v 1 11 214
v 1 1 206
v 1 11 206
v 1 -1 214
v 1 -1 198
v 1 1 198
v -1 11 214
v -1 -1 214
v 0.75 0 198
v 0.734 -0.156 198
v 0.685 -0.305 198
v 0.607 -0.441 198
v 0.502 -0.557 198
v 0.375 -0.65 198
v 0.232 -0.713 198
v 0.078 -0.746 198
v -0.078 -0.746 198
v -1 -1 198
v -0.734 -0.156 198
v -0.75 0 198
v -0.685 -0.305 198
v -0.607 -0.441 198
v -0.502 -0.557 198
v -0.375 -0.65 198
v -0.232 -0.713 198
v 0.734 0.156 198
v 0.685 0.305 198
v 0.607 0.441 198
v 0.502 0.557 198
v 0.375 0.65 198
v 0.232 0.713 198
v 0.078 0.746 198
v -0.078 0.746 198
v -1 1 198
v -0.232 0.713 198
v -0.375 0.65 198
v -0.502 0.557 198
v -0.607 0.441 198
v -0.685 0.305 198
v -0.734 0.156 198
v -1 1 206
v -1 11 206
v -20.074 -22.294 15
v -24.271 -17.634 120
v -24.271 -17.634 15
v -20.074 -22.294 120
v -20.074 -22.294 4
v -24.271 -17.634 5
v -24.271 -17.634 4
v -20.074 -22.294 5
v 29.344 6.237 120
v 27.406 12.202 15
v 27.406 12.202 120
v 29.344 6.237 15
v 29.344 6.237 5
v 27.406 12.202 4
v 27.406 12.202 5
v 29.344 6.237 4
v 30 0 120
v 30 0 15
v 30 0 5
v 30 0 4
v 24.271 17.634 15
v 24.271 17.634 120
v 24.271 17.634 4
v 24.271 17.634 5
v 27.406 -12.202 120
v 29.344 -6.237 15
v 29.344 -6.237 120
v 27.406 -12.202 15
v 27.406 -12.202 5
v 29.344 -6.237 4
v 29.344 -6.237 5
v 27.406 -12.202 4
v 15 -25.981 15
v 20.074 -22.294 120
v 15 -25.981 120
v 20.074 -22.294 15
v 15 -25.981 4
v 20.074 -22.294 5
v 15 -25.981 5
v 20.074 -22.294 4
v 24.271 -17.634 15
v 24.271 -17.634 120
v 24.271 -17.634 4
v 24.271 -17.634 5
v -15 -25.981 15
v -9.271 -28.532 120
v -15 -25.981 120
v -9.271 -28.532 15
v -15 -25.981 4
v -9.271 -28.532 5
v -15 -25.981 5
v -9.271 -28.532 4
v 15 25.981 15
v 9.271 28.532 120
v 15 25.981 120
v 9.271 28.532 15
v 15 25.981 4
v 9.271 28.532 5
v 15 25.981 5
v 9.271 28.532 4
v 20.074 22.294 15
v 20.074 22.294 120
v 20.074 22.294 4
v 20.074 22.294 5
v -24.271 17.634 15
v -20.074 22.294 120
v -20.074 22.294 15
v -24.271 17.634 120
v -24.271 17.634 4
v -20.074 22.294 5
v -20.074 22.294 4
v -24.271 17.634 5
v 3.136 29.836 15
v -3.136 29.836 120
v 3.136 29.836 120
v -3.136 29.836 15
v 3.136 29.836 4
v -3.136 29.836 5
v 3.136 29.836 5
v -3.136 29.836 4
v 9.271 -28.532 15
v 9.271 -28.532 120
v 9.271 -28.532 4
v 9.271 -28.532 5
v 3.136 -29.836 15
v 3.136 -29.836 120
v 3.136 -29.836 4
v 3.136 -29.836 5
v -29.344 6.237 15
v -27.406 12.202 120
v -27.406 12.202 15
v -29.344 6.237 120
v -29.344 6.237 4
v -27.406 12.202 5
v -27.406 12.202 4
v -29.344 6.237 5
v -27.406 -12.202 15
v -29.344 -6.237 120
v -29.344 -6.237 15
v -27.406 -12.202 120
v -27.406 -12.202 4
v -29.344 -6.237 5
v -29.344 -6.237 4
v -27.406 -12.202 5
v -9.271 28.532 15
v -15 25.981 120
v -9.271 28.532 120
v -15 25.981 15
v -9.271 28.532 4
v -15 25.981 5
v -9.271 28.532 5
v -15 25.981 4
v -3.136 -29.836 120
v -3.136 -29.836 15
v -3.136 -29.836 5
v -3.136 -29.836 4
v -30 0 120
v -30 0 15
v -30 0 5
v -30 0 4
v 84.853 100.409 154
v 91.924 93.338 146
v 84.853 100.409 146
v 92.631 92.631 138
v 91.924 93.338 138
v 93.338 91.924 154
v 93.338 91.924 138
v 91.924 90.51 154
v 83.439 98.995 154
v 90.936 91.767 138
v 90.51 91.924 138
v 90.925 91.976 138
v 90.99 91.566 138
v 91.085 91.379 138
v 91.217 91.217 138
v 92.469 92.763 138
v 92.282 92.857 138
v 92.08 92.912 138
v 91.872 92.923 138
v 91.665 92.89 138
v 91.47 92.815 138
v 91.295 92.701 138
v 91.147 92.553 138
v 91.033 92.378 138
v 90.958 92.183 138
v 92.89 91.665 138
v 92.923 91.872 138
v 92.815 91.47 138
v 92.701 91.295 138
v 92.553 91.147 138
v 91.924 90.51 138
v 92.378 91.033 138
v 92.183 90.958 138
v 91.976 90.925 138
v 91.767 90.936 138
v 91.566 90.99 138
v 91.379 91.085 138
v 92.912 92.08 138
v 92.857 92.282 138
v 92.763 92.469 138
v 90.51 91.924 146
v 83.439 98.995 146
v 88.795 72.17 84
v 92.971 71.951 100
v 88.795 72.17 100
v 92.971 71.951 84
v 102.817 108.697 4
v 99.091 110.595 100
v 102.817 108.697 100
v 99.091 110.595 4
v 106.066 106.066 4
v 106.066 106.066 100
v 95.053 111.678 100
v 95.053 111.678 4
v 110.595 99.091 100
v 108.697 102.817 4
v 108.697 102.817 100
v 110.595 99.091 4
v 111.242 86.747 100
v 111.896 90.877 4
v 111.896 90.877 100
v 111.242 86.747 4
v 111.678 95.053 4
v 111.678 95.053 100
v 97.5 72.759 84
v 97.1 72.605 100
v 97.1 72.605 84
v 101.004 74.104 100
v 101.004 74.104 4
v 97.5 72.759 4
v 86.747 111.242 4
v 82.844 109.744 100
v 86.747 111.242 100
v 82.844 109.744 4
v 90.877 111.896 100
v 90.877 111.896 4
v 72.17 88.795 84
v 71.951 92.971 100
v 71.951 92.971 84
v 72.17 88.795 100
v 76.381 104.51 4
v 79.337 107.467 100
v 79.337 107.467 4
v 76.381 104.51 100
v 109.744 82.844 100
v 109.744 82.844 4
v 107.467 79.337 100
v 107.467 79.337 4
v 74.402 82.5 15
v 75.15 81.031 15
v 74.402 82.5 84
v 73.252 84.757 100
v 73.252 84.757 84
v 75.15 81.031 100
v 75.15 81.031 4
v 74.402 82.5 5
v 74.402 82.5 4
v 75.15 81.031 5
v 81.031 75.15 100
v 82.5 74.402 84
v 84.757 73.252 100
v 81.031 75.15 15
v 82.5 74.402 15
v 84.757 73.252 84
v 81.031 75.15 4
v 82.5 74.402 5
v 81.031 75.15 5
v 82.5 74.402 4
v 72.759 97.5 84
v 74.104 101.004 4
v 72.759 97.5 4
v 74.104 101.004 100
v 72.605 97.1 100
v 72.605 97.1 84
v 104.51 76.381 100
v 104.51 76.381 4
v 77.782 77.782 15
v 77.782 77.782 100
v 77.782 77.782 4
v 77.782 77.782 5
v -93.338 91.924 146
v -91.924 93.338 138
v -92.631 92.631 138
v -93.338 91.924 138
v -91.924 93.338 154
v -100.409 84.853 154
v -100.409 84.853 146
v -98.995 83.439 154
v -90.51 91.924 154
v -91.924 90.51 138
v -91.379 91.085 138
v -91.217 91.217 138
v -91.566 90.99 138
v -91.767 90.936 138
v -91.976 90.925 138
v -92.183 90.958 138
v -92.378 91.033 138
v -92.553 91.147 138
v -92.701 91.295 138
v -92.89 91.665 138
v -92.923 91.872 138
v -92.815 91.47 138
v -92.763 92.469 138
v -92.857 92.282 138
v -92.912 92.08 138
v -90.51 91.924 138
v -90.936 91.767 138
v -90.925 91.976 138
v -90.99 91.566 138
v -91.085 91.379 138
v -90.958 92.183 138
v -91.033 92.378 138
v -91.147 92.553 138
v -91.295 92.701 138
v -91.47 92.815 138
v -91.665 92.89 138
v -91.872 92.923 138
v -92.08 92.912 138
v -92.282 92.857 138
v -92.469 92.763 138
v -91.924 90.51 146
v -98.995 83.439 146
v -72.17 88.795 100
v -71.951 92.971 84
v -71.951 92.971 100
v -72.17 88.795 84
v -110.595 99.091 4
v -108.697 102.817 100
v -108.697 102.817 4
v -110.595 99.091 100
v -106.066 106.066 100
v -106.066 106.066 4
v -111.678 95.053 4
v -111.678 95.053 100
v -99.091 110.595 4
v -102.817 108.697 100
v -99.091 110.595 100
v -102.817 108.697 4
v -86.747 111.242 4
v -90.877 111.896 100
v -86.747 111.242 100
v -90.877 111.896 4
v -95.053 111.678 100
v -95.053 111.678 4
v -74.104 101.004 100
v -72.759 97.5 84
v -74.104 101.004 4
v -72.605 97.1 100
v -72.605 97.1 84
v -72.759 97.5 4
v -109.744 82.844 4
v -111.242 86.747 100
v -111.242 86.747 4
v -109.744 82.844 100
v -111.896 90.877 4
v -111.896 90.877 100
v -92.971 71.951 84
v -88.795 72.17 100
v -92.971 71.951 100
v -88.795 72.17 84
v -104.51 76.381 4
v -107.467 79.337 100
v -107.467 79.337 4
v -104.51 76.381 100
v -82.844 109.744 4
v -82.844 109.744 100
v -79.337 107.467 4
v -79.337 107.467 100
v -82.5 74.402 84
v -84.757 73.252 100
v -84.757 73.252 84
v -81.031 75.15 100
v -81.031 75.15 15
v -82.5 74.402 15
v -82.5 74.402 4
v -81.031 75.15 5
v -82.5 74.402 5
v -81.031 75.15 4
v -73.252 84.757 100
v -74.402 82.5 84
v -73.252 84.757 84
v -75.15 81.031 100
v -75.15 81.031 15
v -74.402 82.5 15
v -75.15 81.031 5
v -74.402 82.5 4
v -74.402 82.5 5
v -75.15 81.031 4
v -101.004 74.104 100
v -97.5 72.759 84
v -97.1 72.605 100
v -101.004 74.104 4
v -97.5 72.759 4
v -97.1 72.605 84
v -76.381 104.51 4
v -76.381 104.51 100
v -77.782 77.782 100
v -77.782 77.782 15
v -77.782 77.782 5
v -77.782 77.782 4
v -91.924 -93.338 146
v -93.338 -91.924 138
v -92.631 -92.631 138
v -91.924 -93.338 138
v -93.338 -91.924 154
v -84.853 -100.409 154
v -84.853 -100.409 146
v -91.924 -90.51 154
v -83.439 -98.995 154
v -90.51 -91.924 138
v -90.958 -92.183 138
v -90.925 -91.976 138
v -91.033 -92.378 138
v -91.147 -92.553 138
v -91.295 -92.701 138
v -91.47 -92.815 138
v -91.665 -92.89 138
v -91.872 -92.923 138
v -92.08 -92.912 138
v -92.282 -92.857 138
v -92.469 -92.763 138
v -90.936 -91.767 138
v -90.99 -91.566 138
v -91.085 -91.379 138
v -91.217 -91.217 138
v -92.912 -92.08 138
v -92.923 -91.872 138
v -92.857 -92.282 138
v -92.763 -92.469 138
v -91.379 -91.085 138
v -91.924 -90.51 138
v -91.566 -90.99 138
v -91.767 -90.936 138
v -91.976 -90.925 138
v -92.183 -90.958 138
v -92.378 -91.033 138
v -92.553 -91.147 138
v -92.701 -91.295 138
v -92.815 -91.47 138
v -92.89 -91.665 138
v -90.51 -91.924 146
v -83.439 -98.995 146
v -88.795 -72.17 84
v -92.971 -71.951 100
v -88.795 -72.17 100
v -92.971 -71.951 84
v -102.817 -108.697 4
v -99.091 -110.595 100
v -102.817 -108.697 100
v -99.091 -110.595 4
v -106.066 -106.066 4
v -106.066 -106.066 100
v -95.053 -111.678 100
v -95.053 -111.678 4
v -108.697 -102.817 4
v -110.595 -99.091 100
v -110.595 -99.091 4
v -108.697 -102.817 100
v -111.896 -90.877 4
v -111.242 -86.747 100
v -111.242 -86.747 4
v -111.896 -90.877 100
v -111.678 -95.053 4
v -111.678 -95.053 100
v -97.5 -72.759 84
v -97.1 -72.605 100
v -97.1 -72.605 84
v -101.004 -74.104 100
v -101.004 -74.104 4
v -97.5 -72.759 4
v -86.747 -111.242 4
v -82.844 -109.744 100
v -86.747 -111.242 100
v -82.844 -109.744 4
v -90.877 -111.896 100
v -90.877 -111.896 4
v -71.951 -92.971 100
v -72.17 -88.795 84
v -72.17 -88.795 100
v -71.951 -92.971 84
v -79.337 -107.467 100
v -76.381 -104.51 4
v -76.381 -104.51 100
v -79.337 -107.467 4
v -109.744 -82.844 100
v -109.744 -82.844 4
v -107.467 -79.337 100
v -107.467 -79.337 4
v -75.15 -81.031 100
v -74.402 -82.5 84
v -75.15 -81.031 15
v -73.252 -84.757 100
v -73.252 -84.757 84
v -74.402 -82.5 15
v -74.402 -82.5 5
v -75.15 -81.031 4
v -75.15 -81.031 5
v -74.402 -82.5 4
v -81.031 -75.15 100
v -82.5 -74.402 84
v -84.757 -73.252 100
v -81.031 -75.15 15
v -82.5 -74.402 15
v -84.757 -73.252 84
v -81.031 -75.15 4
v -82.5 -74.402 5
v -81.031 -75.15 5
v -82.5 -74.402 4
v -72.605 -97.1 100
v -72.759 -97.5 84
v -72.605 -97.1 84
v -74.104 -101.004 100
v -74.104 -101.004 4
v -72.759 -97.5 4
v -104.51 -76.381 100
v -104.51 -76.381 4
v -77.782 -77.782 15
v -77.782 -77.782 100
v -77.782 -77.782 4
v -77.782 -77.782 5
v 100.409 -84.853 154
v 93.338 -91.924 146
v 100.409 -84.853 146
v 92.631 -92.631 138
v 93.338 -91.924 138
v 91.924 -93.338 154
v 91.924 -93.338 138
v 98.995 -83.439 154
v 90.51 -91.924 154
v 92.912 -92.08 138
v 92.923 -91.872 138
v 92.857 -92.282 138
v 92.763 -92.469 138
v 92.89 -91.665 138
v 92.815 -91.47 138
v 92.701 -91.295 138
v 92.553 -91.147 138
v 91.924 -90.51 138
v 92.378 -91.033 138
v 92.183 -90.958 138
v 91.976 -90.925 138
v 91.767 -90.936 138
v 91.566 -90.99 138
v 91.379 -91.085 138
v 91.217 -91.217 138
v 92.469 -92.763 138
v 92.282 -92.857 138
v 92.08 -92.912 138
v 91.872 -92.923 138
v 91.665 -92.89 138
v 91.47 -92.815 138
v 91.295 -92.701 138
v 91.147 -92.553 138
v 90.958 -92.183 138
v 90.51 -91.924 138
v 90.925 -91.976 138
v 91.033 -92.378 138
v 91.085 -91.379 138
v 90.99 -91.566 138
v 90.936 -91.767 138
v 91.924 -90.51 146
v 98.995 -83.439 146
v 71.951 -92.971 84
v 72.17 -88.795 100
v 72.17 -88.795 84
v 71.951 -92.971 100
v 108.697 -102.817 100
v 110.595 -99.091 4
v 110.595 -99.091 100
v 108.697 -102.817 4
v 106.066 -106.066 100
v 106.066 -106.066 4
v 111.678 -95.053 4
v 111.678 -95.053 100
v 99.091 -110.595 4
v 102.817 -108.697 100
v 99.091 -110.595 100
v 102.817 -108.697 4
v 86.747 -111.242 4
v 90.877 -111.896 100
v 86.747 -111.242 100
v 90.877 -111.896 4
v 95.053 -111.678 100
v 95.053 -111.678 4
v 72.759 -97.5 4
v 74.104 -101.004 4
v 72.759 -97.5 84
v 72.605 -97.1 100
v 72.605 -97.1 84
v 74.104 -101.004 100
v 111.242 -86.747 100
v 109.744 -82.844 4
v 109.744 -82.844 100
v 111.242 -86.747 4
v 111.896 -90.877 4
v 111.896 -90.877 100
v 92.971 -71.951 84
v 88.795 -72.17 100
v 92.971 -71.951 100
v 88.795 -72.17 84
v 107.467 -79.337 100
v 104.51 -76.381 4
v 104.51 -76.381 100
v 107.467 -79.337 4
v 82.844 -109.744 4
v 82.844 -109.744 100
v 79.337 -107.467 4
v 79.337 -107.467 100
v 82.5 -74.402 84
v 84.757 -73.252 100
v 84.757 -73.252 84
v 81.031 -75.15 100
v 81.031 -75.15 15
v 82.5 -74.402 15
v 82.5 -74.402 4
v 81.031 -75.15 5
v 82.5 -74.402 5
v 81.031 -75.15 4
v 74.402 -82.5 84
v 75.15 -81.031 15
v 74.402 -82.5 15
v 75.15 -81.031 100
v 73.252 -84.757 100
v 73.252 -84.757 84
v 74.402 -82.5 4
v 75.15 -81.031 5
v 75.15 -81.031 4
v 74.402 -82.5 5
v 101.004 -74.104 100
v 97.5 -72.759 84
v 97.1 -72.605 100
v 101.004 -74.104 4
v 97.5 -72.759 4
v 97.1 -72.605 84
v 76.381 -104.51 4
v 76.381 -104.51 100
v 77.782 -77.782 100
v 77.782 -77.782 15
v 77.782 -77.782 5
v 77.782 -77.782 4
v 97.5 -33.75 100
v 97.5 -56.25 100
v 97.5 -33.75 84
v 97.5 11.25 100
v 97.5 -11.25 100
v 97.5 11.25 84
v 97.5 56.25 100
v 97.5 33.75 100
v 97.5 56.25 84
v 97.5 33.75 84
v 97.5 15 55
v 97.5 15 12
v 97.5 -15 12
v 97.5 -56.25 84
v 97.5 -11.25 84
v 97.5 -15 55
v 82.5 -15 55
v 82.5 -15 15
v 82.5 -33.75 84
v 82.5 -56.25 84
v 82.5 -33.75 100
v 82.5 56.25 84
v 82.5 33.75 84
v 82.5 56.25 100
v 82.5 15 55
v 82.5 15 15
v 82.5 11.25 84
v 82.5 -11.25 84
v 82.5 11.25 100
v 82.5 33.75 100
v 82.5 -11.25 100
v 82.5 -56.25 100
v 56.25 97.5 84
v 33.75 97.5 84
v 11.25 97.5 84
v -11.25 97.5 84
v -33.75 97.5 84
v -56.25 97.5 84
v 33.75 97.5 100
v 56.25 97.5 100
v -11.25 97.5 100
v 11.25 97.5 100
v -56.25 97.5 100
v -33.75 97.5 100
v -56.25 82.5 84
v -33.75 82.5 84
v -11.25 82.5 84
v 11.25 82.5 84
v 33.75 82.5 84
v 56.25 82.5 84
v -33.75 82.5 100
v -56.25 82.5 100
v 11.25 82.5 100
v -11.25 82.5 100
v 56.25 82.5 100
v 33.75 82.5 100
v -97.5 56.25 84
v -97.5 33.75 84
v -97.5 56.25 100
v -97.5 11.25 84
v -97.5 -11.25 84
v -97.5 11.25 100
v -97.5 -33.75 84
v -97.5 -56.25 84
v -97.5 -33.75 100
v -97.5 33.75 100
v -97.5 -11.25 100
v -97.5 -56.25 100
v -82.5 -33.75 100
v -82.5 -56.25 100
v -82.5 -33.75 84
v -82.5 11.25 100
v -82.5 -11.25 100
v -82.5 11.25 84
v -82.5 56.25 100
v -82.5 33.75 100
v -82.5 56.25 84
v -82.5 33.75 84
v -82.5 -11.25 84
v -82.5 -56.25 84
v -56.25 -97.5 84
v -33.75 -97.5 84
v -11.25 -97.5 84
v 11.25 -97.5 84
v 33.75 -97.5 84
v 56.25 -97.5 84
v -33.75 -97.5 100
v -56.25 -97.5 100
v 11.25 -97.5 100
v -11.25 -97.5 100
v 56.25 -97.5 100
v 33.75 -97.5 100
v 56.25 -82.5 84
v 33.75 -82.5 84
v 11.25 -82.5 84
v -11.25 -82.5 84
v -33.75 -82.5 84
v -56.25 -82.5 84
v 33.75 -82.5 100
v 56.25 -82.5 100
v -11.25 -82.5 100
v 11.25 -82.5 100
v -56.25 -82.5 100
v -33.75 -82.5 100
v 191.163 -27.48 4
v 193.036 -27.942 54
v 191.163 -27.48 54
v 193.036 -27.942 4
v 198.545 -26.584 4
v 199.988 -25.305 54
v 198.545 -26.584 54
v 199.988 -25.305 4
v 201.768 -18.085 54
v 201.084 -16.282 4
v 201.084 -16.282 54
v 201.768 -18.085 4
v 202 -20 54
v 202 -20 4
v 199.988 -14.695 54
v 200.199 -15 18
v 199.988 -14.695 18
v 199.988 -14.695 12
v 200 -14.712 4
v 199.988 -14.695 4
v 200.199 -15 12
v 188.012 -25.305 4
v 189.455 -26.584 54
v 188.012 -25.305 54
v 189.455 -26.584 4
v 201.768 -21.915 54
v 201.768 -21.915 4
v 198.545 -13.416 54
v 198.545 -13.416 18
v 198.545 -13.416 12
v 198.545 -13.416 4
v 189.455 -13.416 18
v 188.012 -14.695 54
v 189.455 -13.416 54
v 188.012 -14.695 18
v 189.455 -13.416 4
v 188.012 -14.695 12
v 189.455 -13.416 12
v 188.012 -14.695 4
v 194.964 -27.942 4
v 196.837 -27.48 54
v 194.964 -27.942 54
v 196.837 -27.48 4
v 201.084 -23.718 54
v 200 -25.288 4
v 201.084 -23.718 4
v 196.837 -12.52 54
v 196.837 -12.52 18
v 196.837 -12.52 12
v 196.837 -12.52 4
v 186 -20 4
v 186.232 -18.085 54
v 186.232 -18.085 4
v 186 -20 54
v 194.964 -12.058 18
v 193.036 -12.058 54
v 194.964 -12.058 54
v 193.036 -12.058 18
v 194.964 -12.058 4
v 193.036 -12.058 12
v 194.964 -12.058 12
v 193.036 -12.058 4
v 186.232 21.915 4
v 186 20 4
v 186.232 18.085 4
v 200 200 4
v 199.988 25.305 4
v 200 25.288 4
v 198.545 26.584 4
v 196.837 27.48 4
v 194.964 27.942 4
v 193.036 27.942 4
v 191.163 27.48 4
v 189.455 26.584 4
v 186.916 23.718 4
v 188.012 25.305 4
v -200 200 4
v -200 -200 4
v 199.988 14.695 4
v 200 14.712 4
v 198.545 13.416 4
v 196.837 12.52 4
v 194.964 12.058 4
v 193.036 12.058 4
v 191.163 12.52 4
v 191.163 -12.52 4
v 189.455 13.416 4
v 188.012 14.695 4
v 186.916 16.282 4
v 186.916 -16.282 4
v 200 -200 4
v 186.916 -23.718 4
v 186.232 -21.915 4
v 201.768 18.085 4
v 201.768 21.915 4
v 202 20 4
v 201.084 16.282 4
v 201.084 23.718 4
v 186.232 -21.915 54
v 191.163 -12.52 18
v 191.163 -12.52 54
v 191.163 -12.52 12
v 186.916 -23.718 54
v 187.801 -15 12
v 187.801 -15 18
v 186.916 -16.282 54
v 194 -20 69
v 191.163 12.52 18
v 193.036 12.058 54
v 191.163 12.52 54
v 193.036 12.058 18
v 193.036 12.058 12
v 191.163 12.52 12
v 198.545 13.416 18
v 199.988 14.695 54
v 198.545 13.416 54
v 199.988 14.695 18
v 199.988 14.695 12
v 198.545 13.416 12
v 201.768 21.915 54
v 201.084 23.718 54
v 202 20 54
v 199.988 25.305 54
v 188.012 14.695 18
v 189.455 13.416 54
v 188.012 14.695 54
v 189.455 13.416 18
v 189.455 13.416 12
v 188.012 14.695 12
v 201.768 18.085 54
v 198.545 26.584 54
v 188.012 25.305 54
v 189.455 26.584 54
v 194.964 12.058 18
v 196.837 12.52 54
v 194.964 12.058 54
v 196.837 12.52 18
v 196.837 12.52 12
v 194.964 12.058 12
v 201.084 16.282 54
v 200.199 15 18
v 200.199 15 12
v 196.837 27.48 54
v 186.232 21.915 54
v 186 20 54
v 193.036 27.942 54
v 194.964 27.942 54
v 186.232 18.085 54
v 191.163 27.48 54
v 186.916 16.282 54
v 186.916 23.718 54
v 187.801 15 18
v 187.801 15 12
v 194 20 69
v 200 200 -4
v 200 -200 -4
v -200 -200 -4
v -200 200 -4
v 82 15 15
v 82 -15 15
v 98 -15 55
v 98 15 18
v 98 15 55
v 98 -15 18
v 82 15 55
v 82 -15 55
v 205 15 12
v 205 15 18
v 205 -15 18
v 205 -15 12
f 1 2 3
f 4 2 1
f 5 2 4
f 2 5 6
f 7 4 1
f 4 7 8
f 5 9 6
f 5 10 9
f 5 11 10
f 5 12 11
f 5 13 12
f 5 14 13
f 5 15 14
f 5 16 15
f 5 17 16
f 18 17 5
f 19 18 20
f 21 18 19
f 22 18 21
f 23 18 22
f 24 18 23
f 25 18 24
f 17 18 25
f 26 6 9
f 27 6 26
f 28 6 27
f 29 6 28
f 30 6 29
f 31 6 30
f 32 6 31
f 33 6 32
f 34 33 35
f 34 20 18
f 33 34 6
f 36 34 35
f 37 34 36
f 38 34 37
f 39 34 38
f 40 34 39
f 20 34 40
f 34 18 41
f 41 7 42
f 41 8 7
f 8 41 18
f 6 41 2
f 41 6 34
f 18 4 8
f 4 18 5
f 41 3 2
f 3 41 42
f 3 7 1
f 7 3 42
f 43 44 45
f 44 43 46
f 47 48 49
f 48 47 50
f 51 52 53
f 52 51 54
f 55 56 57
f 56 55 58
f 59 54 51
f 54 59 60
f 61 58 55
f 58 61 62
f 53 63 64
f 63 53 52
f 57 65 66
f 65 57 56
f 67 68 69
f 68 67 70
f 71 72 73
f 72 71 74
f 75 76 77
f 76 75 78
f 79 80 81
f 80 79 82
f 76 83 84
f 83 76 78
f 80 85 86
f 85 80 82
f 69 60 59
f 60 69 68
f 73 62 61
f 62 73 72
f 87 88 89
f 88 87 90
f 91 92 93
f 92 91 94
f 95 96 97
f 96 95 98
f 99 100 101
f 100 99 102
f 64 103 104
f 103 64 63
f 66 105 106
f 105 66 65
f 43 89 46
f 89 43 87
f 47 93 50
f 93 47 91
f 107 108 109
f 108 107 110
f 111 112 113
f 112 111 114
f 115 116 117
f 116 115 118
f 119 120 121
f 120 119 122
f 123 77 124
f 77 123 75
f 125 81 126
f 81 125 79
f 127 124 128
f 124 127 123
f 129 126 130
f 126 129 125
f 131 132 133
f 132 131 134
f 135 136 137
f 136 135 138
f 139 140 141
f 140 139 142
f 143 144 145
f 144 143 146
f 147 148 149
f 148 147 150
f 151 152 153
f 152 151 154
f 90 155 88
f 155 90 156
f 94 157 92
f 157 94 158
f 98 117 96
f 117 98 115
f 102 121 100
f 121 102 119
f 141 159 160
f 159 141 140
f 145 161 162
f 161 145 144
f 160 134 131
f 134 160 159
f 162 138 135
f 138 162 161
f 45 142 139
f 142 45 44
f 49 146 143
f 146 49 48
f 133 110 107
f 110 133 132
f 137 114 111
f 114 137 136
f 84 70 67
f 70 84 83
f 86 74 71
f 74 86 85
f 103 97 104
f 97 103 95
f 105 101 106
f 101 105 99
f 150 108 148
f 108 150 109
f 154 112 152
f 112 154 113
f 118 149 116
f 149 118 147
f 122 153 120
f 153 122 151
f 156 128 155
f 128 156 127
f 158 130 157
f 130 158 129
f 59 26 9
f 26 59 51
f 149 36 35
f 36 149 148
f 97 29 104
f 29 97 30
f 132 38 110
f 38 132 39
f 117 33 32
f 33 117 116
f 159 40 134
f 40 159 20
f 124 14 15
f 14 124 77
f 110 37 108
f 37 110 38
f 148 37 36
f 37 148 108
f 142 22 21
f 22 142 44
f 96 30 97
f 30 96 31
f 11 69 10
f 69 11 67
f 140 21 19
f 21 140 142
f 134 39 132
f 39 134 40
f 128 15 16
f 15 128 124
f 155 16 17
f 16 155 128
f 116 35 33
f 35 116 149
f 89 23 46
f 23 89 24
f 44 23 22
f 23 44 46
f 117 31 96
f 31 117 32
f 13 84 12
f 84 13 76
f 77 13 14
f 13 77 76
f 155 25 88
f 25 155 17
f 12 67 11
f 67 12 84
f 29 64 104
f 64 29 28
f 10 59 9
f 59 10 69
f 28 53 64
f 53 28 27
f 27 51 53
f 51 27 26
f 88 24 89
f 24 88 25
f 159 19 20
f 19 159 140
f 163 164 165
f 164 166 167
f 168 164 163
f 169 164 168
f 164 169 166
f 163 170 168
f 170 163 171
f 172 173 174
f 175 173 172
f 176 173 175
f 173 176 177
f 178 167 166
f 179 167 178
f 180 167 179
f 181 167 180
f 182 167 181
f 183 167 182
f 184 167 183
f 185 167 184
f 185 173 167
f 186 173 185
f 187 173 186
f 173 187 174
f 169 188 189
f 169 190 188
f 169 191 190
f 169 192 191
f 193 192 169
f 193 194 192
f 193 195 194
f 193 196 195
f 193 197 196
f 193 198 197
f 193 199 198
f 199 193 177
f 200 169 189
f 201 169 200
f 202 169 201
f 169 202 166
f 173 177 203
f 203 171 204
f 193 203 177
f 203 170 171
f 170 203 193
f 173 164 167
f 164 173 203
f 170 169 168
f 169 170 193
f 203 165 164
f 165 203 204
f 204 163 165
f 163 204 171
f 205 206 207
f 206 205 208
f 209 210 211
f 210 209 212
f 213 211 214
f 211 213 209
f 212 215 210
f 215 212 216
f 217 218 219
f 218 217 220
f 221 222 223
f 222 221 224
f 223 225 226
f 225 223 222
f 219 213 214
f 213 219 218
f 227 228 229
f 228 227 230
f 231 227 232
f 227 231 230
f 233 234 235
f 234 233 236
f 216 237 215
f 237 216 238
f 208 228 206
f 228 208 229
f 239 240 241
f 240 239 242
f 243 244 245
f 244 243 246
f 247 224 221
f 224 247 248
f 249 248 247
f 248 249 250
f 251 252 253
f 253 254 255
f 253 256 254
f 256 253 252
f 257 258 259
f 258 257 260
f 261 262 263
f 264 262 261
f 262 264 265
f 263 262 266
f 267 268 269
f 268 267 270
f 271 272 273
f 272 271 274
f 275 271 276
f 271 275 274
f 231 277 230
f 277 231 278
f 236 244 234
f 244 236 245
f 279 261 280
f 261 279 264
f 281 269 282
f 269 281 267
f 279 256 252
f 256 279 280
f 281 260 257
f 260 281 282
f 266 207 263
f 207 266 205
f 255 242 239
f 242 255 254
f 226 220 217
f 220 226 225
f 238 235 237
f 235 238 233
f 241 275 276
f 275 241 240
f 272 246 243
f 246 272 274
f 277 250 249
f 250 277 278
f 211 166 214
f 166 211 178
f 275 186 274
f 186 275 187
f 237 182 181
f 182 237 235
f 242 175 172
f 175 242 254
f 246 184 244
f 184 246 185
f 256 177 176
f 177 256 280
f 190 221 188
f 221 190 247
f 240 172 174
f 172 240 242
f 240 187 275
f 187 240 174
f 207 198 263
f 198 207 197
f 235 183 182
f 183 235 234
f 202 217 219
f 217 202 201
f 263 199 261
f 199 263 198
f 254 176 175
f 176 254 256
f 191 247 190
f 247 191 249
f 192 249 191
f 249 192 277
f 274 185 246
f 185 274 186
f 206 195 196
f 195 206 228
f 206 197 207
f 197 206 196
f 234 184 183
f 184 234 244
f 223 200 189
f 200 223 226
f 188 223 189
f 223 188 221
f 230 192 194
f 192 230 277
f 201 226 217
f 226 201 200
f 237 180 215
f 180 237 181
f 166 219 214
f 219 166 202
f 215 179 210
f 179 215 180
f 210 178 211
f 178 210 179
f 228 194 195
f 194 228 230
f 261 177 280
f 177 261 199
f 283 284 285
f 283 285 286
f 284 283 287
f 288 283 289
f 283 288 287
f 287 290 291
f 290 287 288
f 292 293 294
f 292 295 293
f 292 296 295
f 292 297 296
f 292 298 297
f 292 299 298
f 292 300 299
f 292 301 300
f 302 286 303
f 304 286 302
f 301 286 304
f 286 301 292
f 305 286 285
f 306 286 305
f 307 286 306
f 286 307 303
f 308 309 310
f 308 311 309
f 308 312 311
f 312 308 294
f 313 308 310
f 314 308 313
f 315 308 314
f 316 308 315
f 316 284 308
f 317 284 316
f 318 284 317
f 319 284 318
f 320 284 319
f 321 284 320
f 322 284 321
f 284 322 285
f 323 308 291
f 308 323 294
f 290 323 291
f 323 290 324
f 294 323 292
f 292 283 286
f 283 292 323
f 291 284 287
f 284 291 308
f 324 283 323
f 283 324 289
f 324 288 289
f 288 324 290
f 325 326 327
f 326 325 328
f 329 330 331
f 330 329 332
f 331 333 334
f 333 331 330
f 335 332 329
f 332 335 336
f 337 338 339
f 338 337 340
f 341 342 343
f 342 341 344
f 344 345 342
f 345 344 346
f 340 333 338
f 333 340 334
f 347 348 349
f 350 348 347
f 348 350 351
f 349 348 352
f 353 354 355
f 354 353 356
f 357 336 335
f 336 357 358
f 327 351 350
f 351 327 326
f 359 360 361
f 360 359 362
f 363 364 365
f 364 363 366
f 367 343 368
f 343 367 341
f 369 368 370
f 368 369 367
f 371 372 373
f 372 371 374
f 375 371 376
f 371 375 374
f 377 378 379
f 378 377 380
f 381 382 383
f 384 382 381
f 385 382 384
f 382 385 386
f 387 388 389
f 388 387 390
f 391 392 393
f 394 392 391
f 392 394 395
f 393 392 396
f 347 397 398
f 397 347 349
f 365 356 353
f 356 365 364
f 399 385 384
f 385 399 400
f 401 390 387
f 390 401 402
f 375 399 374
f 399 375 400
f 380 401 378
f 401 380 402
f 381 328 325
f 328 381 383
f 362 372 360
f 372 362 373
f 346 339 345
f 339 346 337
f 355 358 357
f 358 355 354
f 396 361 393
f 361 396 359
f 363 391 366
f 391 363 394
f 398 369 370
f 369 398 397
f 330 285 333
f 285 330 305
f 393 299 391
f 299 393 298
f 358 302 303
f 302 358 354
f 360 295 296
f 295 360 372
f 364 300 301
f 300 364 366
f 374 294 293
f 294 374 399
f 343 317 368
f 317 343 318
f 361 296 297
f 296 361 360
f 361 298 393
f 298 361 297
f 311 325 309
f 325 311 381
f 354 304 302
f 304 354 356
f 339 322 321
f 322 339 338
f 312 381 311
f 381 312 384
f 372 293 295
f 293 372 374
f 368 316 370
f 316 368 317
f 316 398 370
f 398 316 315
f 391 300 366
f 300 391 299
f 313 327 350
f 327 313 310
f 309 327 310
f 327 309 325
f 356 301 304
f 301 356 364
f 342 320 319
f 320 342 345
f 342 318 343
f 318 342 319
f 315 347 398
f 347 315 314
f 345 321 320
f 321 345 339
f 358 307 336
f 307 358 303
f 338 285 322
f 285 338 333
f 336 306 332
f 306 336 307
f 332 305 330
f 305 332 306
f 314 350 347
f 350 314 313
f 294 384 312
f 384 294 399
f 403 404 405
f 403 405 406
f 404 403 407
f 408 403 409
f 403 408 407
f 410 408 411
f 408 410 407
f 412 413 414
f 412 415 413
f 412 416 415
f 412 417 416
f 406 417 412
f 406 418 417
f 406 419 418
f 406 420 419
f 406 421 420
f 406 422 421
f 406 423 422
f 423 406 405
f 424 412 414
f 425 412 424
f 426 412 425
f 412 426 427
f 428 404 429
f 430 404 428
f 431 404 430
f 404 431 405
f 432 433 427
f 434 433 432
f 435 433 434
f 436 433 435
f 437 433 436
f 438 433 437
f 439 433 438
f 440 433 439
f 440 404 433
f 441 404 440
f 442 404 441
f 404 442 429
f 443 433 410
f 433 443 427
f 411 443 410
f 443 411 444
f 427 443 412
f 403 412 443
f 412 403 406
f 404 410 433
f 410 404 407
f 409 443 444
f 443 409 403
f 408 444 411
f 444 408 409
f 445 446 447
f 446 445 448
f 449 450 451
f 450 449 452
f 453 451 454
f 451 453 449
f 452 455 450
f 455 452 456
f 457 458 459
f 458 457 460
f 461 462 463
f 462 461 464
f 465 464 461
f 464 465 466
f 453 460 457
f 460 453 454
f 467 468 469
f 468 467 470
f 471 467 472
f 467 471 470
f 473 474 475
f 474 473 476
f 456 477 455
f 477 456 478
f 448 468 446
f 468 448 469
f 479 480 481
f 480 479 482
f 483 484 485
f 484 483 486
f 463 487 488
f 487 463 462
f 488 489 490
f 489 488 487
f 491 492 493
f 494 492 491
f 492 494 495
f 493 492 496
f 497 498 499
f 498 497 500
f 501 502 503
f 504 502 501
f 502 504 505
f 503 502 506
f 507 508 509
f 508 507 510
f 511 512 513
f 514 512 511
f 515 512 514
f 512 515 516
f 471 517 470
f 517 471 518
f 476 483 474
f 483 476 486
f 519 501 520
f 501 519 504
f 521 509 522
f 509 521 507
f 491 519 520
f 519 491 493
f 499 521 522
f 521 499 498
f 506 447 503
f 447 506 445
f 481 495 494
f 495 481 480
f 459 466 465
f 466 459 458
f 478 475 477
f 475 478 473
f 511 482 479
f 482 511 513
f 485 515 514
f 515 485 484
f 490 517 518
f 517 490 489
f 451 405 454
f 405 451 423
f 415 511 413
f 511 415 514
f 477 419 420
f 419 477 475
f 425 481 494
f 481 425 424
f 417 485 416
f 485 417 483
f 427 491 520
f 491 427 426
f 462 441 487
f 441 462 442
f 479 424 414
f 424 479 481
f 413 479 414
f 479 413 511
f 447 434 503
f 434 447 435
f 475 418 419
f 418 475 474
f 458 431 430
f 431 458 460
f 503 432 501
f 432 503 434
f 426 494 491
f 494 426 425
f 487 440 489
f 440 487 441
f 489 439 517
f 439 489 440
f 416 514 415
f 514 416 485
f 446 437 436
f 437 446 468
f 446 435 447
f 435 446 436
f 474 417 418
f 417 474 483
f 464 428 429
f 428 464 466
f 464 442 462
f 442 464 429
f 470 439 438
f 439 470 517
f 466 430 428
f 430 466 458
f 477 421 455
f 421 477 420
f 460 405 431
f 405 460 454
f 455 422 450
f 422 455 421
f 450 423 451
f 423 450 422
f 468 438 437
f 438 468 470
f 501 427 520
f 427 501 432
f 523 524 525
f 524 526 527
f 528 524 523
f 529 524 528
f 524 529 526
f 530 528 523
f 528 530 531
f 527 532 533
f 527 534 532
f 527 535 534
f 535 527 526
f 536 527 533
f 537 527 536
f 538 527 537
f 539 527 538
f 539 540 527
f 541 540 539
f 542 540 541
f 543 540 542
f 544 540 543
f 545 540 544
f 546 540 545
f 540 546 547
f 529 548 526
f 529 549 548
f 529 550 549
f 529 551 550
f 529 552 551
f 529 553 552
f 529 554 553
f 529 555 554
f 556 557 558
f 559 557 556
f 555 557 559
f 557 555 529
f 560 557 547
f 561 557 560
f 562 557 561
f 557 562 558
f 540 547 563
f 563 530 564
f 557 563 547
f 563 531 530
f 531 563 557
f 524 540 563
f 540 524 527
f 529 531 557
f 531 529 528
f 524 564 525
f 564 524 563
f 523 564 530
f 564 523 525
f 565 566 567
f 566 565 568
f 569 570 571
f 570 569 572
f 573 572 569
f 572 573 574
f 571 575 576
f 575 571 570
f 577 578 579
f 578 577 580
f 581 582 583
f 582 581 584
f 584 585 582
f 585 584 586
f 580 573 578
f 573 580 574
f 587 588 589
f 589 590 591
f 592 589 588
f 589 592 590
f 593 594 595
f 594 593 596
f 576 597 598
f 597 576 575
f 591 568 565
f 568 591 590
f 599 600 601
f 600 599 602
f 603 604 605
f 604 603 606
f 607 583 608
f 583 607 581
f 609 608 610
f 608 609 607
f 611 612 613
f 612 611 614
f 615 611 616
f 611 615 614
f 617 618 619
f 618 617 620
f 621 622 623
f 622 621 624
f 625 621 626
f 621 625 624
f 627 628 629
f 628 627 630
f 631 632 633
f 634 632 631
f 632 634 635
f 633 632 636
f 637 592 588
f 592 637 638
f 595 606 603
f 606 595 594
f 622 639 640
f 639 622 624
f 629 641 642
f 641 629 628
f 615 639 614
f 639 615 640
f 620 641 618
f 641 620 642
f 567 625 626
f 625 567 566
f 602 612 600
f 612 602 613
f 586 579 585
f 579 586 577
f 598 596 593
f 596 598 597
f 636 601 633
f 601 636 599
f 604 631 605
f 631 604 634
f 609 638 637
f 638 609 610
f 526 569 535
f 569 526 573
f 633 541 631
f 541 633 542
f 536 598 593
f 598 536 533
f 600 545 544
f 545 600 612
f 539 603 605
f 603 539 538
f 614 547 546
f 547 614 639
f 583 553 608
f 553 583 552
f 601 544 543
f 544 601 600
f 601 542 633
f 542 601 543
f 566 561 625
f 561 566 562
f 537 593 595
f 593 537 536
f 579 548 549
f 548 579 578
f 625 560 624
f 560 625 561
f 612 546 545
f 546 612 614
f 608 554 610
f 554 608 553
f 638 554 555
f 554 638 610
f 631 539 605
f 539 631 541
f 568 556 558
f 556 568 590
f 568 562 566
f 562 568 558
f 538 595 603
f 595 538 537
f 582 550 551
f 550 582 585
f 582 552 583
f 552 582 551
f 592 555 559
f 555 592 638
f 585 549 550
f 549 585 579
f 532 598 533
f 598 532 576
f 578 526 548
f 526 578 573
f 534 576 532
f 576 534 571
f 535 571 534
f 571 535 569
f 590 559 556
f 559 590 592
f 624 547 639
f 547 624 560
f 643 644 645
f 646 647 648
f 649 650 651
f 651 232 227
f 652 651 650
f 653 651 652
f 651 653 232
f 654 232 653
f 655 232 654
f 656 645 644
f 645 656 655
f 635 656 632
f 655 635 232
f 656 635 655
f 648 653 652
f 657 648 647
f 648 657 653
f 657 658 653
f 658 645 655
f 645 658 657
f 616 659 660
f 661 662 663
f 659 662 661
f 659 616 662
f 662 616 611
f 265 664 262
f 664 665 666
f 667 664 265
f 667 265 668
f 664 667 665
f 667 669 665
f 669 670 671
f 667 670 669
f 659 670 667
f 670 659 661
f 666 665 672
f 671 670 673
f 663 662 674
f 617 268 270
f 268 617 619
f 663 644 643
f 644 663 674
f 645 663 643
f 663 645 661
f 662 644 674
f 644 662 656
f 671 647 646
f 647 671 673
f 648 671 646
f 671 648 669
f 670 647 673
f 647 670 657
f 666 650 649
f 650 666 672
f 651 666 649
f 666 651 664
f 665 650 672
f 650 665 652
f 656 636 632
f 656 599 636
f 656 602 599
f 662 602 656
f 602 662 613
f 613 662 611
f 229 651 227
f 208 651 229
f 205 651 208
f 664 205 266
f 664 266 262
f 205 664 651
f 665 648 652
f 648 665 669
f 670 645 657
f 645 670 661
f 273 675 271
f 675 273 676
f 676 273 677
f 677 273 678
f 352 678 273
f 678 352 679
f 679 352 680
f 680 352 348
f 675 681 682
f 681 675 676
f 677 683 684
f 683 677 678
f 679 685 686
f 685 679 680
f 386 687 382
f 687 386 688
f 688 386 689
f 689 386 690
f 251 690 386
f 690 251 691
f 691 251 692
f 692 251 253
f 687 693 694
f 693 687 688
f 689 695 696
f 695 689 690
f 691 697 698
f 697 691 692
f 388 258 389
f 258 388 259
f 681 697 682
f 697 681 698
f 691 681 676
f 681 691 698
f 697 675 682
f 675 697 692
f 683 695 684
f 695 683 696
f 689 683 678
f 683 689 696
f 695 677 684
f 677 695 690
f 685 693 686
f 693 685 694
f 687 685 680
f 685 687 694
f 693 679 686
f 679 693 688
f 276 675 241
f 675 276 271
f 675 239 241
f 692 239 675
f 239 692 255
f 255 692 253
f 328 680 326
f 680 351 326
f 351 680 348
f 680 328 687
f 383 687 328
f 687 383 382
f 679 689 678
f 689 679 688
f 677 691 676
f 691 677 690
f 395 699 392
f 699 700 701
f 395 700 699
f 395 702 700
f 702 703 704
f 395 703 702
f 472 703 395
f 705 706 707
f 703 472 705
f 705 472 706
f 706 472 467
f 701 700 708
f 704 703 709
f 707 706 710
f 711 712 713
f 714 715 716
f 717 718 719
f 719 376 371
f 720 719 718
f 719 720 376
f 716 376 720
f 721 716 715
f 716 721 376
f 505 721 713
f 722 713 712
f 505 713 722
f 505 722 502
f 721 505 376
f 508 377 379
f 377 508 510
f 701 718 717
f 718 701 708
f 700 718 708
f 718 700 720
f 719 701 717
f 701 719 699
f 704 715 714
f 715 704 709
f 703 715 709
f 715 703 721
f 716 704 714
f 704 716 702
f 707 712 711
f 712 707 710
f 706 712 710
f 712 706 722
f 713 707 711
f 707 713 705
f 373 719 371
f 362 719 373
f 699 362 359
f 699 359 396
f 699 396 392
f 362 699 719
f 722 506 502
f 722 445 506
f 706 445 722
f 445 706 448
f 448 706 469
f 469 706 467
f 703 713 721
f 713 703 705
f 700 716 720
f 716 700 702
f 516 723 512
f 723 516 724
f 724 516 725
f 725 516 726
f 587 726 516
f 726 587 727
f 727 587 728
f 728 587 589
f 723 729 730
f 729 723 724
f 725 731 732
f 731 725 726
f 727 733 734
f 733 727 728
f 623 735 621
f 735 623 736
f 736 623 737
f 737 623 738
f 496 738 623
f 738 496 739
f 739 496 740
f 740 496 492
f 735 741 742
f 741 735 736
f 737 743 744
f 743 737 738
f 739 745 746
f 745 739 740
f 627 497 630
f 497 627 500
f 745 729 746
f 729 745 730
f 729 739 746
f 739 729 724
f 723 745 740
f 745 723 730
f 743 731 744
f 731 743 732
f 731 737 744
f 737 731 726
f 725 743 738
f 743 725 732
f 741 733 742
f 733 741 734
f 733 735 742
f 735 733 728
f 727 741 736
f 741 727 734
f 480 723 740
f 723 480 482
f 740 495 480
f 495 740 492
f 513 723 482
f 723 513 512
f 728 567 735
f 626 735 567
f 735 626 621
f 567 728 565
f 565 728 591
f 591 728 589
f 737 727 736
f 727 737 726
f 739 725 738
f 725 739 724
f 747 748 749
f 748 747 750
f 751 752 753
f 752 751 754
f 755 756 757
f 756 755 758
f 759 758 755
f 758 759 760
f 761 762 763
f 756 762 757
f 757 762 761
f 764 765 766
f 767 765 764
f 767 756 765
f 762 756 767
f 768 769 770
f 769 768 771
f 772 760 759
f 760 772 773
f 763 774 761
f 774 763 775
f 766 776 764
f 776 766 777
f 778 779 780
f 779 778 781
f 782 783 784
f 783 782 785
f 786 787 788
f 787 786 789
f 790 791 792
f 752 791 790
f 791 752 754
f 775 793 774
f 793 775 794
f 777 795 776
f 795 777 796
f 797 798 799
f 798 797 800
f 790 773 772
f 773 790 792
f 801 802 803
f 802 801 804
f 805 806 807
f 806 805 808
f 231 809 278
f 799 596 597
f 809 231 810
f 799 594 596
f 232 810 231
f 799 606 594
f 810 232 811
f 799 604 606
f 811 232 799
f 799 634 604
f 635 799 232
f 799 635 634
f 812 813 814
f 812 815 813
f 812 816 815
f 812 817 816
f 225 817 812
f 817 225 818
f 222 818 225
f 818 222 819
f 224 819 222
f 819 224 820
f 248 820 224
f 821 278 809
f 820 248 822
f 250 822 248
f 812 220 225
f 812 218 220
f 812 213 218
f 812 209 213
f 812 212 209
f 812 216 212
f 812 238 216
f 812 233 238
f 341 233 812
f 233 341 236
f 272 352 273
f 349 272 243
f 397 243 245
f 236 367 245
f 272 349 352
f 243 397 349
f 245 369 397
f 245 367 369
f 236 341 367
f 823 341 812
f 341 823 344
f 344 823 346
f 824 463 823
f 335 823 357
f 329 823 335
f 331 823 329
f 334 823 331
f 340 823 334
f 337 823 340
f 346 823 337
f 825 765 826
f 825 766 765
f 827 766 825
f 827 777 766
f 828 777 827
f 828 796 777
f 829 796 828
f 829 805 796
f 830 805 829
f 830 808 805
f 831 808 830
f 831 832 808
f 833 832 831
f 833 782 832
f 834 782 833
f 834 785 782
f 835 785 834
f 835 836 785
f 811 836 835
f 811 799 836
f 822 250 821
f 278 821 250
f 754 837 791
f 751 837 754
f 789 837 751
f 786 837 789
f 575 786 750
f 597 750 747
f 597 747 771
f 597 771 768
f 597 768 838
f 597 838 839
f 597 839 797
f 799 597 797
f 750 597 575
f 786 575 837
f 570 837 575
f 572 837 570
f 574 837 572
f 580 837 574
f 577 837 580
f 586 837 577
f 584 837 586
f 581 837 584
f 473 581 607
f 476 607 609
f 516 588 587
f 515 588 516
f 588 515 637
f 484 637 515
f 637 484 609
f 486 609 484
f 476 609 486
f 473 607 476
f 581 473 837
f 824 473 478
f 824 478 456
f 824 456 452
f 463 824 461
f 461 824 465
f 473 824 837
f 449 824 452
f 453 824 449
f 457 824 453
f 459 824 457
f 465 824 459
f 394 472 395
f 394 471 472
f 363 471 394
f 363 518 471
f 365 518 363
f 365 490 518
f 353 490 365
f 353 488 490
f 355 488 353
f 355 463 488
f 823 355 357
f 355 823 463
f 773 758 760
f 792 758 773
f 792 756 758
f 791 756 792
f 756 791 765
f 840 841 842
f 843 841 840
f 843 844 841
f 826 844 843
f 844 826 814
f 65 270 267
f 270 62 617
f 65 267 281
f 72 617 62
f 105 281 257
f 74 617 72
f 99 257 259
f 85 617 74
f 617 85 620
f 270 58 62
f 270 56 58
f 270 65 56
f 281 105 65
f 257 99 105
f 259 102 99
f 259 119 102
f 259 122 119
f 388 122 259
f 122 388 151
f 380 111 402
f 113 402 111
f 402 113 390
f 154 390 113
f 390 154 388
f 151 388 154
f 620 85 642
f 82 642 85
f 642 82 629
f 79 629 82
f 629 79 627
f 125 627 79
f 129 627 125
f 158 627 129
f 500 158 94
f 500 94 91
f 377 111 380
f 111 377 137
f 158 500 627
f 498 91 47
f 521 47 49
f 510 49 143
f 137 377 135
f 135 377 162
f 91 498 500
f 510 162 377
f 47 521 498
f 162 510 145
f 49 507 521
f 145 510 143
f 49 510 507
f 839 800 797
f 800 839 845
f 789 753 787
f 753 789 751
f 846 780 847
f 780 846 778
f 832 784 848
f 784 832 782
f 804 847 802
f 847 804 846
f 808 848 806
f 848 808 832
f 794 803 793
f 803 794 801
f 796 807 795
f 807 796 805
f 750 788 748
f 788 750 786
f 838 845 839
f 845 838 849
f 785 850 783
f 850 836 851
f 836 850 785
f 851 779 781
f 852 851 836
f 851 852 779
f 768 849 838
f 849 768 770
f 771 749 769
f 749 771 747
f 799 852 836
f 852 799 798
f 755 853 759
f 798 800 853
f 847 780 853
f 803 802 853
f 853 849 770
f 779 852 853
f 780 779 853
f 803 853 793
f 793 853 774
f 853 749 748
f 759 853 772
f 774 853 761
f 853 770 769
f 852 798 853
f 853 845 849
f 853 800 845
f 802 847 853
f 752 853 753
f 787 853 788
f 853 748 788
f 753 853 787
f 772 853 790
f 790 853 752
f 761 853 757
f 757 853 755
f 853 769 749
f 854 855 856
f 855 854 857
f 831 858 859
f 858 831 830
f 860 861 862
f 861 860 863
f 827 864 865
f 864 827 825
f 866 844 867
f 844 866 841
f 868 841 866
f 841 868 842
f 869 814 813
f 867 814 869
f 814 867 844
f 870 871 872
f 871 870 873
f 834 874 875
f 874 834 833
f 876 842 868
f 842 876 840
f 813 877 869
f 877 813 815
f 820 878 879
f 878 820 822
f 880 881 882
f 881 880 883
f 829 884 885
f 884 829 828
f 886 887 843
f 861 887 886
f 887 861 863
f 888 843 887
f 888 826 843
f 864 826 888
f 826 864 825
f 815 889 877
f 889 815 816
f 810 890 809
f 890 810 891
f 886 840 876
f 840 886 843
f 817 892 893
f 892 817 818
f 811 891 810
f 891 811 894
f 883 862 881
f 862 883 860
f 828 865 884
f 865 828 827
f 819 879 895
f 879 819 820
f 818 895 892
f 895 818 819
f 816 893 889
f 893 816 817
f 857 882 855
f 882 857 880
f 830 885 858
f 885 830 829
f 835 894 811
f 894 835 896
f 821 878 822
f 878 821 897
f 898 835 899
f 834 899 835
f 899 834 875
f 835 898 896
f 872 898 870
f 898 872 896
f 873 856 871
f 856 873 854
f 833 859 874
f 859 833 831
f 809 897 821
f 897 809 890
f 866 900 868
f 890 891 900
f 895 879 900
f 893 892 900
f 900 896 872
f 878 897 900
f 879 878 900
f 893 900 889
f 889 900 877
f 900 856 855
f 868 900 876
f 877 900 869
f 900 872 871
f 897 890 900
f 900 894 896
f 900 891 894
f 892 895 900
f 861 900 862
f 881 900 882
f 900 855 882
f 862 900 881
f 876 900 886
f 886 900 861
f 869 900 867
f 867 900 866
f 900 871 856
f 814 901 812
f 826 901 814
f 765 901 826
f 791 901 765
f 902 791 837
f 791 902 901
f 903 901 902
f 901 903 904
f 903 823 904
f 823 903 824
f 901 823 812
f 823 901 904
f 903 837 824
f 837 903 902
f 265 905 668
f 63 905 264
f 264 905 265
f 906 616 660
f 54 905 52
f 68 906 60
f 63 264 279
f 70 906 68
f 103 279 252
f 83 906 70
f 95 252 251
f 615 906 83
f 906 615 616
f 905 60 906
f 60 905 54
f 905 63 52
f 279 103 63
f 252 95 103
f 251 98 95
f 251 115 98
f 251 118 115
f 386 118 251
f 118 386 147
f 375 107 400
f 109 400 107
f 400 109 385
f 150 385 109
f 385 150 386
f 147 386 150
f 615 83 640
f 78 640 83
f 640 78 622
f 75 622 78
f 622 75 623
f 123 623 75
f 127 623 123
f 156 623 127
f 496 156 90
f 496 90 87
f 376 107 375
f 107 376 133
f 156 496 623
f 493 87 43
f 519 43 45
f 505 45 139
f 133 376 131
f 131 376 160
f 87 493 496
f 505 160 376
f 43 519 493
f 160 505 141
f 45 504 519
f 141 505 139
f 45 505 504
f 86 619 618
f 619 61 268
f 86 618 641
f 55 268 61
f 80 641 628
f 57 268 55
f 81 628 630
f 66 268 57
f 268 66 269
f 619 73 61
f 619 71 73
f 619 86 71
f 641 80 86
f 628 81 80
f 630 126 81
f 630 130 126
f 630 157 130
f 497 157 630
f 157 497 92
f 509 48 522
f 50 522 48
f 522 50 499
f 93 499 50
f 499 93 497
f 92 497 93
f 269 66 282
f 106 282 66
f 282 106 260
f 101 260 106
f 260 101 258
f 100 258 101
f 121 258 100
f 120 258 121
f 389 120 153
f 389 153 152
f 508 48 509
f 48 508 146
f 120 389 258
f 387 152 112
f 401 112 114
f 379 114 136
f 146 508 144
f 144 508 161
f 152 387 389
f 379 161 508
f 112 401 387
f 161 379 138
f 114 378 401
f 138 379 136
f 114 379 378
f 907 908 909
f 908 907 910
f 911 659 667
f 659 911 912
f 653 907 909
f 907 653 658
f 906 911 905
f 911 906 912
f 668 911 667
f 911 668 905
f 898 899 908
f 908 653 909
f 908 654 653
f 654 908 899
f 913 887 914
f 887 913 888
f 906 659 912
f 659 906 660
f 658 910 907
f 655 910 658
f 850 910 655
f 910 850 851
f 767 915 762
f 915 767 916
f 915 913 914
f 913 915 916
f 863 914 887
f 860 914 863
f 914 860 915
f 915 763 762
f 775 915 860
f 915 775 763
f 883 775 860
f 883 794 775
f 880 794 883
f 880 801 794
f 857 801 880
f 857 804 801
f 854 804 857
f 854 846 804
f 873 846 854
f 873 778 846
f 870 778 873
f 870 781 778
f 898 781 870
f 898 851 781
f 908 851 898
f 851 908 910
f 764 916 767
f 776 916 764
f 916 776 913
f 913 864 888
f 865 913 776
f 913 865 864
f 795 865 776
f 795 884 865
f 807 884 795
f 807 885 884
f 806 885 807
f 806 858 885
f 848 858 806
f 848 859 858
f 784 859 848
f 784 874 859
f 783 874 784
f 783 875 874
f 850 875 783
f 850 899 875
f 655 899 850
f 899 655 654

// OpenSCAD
castle_height = 100;
castle_width = castle_height + 80;

color("lightblue") cube([400,400,8], center = true);
 
color([0.5, 0.5, 0.0, 1.0]) translate([0, 0, 10]) cube([castle_width - 2, castle_width - 2, 10], center=true);

translate([0, 0, castle_height/2 + 10]) union() {
    color("grey") cylinder(castle_height + 20, 30, 30, center = true);
    color([0.92, 0.65, 0.6, 1.0]) translate([0,0,castle_height/2 + 10 + 40]) cylinder(80, 30, 0, center = true);
    
    translate([0,0,castle_height/2 + 96]) union() {
        color([0.5, 0.3, 0.1, 1.0]) cube([2,2,16], center=true);
        color("purple") translate([0, 6, 4]) cube([2,10,8], center=true);
    }
    
}


for (i = [0:90:360]) {
rotate([0, 0, i + 45]) translate([castle_width/2 + 40, 0, castle_height/2]) 
union(){
    color("grey") cylinder(castle_height, 20,20, center = true);
    color([0.92, 0.65, 0.6, 1.0]) translate([0,0,castle_height/2 + 20]) cylinder(40, 20, 0, center = true);
    
        translate([0,0,castle_height - 4]) union() {
        color([0.5, 0.3, 0.1, 1.0]) cube([2,2,16], center=true);
        color("purple") translate([0, 6, 4]) cube([2,10,8], center=true);
    }
    
    
    
 }


 
} 

color("grey") for (i = [0:90:360]) {
rotate([0, 0, i]) translate([castle_width/2, - castle_width/2, castle_height/2]) 
    union(){
        for(i=[0: castle_width/8: castle_width/2]) {
            translate([0, i * 2, 0]) cube([15, castle_width/8, castle_height], center=true);
        }
         for(i=[castle_width/8: castle_width/8: castle_width]) {
            translate([0, i, -8]) cube([15, castle_width/8, castle_height - 16], center=true);
        }
       } 
} 


color([0.5, 0.3, 0.1, 1.0]) translate([castle_width/2, 0, 35]) cube([16, 30, 40], center=true);

color("grey") translate([150, 0, 15]) cube([110, 30, 6], center=true);

translate([194, -20, castle_height/4 + 4]) union(){
    color("grey") cylinder(castle_height/2, 8,8, center = true);
    color([0.92, 0.65, 0.6, 1.0]) translate([0,0,castle_height/4 + 15/2]) cylinder(15, 8, 0, center = true);
}

translate([194, 20, castle_height/4 + 4]) union(){
    color("grey") cylinder(castle_height/2, 8,8, center = true);
    color([0.92, 0.65, 0.6, 1.0]) translate([0,0,castle_height/4 + 15/2]) cylinder(15, 8, 0, center = true);
}
